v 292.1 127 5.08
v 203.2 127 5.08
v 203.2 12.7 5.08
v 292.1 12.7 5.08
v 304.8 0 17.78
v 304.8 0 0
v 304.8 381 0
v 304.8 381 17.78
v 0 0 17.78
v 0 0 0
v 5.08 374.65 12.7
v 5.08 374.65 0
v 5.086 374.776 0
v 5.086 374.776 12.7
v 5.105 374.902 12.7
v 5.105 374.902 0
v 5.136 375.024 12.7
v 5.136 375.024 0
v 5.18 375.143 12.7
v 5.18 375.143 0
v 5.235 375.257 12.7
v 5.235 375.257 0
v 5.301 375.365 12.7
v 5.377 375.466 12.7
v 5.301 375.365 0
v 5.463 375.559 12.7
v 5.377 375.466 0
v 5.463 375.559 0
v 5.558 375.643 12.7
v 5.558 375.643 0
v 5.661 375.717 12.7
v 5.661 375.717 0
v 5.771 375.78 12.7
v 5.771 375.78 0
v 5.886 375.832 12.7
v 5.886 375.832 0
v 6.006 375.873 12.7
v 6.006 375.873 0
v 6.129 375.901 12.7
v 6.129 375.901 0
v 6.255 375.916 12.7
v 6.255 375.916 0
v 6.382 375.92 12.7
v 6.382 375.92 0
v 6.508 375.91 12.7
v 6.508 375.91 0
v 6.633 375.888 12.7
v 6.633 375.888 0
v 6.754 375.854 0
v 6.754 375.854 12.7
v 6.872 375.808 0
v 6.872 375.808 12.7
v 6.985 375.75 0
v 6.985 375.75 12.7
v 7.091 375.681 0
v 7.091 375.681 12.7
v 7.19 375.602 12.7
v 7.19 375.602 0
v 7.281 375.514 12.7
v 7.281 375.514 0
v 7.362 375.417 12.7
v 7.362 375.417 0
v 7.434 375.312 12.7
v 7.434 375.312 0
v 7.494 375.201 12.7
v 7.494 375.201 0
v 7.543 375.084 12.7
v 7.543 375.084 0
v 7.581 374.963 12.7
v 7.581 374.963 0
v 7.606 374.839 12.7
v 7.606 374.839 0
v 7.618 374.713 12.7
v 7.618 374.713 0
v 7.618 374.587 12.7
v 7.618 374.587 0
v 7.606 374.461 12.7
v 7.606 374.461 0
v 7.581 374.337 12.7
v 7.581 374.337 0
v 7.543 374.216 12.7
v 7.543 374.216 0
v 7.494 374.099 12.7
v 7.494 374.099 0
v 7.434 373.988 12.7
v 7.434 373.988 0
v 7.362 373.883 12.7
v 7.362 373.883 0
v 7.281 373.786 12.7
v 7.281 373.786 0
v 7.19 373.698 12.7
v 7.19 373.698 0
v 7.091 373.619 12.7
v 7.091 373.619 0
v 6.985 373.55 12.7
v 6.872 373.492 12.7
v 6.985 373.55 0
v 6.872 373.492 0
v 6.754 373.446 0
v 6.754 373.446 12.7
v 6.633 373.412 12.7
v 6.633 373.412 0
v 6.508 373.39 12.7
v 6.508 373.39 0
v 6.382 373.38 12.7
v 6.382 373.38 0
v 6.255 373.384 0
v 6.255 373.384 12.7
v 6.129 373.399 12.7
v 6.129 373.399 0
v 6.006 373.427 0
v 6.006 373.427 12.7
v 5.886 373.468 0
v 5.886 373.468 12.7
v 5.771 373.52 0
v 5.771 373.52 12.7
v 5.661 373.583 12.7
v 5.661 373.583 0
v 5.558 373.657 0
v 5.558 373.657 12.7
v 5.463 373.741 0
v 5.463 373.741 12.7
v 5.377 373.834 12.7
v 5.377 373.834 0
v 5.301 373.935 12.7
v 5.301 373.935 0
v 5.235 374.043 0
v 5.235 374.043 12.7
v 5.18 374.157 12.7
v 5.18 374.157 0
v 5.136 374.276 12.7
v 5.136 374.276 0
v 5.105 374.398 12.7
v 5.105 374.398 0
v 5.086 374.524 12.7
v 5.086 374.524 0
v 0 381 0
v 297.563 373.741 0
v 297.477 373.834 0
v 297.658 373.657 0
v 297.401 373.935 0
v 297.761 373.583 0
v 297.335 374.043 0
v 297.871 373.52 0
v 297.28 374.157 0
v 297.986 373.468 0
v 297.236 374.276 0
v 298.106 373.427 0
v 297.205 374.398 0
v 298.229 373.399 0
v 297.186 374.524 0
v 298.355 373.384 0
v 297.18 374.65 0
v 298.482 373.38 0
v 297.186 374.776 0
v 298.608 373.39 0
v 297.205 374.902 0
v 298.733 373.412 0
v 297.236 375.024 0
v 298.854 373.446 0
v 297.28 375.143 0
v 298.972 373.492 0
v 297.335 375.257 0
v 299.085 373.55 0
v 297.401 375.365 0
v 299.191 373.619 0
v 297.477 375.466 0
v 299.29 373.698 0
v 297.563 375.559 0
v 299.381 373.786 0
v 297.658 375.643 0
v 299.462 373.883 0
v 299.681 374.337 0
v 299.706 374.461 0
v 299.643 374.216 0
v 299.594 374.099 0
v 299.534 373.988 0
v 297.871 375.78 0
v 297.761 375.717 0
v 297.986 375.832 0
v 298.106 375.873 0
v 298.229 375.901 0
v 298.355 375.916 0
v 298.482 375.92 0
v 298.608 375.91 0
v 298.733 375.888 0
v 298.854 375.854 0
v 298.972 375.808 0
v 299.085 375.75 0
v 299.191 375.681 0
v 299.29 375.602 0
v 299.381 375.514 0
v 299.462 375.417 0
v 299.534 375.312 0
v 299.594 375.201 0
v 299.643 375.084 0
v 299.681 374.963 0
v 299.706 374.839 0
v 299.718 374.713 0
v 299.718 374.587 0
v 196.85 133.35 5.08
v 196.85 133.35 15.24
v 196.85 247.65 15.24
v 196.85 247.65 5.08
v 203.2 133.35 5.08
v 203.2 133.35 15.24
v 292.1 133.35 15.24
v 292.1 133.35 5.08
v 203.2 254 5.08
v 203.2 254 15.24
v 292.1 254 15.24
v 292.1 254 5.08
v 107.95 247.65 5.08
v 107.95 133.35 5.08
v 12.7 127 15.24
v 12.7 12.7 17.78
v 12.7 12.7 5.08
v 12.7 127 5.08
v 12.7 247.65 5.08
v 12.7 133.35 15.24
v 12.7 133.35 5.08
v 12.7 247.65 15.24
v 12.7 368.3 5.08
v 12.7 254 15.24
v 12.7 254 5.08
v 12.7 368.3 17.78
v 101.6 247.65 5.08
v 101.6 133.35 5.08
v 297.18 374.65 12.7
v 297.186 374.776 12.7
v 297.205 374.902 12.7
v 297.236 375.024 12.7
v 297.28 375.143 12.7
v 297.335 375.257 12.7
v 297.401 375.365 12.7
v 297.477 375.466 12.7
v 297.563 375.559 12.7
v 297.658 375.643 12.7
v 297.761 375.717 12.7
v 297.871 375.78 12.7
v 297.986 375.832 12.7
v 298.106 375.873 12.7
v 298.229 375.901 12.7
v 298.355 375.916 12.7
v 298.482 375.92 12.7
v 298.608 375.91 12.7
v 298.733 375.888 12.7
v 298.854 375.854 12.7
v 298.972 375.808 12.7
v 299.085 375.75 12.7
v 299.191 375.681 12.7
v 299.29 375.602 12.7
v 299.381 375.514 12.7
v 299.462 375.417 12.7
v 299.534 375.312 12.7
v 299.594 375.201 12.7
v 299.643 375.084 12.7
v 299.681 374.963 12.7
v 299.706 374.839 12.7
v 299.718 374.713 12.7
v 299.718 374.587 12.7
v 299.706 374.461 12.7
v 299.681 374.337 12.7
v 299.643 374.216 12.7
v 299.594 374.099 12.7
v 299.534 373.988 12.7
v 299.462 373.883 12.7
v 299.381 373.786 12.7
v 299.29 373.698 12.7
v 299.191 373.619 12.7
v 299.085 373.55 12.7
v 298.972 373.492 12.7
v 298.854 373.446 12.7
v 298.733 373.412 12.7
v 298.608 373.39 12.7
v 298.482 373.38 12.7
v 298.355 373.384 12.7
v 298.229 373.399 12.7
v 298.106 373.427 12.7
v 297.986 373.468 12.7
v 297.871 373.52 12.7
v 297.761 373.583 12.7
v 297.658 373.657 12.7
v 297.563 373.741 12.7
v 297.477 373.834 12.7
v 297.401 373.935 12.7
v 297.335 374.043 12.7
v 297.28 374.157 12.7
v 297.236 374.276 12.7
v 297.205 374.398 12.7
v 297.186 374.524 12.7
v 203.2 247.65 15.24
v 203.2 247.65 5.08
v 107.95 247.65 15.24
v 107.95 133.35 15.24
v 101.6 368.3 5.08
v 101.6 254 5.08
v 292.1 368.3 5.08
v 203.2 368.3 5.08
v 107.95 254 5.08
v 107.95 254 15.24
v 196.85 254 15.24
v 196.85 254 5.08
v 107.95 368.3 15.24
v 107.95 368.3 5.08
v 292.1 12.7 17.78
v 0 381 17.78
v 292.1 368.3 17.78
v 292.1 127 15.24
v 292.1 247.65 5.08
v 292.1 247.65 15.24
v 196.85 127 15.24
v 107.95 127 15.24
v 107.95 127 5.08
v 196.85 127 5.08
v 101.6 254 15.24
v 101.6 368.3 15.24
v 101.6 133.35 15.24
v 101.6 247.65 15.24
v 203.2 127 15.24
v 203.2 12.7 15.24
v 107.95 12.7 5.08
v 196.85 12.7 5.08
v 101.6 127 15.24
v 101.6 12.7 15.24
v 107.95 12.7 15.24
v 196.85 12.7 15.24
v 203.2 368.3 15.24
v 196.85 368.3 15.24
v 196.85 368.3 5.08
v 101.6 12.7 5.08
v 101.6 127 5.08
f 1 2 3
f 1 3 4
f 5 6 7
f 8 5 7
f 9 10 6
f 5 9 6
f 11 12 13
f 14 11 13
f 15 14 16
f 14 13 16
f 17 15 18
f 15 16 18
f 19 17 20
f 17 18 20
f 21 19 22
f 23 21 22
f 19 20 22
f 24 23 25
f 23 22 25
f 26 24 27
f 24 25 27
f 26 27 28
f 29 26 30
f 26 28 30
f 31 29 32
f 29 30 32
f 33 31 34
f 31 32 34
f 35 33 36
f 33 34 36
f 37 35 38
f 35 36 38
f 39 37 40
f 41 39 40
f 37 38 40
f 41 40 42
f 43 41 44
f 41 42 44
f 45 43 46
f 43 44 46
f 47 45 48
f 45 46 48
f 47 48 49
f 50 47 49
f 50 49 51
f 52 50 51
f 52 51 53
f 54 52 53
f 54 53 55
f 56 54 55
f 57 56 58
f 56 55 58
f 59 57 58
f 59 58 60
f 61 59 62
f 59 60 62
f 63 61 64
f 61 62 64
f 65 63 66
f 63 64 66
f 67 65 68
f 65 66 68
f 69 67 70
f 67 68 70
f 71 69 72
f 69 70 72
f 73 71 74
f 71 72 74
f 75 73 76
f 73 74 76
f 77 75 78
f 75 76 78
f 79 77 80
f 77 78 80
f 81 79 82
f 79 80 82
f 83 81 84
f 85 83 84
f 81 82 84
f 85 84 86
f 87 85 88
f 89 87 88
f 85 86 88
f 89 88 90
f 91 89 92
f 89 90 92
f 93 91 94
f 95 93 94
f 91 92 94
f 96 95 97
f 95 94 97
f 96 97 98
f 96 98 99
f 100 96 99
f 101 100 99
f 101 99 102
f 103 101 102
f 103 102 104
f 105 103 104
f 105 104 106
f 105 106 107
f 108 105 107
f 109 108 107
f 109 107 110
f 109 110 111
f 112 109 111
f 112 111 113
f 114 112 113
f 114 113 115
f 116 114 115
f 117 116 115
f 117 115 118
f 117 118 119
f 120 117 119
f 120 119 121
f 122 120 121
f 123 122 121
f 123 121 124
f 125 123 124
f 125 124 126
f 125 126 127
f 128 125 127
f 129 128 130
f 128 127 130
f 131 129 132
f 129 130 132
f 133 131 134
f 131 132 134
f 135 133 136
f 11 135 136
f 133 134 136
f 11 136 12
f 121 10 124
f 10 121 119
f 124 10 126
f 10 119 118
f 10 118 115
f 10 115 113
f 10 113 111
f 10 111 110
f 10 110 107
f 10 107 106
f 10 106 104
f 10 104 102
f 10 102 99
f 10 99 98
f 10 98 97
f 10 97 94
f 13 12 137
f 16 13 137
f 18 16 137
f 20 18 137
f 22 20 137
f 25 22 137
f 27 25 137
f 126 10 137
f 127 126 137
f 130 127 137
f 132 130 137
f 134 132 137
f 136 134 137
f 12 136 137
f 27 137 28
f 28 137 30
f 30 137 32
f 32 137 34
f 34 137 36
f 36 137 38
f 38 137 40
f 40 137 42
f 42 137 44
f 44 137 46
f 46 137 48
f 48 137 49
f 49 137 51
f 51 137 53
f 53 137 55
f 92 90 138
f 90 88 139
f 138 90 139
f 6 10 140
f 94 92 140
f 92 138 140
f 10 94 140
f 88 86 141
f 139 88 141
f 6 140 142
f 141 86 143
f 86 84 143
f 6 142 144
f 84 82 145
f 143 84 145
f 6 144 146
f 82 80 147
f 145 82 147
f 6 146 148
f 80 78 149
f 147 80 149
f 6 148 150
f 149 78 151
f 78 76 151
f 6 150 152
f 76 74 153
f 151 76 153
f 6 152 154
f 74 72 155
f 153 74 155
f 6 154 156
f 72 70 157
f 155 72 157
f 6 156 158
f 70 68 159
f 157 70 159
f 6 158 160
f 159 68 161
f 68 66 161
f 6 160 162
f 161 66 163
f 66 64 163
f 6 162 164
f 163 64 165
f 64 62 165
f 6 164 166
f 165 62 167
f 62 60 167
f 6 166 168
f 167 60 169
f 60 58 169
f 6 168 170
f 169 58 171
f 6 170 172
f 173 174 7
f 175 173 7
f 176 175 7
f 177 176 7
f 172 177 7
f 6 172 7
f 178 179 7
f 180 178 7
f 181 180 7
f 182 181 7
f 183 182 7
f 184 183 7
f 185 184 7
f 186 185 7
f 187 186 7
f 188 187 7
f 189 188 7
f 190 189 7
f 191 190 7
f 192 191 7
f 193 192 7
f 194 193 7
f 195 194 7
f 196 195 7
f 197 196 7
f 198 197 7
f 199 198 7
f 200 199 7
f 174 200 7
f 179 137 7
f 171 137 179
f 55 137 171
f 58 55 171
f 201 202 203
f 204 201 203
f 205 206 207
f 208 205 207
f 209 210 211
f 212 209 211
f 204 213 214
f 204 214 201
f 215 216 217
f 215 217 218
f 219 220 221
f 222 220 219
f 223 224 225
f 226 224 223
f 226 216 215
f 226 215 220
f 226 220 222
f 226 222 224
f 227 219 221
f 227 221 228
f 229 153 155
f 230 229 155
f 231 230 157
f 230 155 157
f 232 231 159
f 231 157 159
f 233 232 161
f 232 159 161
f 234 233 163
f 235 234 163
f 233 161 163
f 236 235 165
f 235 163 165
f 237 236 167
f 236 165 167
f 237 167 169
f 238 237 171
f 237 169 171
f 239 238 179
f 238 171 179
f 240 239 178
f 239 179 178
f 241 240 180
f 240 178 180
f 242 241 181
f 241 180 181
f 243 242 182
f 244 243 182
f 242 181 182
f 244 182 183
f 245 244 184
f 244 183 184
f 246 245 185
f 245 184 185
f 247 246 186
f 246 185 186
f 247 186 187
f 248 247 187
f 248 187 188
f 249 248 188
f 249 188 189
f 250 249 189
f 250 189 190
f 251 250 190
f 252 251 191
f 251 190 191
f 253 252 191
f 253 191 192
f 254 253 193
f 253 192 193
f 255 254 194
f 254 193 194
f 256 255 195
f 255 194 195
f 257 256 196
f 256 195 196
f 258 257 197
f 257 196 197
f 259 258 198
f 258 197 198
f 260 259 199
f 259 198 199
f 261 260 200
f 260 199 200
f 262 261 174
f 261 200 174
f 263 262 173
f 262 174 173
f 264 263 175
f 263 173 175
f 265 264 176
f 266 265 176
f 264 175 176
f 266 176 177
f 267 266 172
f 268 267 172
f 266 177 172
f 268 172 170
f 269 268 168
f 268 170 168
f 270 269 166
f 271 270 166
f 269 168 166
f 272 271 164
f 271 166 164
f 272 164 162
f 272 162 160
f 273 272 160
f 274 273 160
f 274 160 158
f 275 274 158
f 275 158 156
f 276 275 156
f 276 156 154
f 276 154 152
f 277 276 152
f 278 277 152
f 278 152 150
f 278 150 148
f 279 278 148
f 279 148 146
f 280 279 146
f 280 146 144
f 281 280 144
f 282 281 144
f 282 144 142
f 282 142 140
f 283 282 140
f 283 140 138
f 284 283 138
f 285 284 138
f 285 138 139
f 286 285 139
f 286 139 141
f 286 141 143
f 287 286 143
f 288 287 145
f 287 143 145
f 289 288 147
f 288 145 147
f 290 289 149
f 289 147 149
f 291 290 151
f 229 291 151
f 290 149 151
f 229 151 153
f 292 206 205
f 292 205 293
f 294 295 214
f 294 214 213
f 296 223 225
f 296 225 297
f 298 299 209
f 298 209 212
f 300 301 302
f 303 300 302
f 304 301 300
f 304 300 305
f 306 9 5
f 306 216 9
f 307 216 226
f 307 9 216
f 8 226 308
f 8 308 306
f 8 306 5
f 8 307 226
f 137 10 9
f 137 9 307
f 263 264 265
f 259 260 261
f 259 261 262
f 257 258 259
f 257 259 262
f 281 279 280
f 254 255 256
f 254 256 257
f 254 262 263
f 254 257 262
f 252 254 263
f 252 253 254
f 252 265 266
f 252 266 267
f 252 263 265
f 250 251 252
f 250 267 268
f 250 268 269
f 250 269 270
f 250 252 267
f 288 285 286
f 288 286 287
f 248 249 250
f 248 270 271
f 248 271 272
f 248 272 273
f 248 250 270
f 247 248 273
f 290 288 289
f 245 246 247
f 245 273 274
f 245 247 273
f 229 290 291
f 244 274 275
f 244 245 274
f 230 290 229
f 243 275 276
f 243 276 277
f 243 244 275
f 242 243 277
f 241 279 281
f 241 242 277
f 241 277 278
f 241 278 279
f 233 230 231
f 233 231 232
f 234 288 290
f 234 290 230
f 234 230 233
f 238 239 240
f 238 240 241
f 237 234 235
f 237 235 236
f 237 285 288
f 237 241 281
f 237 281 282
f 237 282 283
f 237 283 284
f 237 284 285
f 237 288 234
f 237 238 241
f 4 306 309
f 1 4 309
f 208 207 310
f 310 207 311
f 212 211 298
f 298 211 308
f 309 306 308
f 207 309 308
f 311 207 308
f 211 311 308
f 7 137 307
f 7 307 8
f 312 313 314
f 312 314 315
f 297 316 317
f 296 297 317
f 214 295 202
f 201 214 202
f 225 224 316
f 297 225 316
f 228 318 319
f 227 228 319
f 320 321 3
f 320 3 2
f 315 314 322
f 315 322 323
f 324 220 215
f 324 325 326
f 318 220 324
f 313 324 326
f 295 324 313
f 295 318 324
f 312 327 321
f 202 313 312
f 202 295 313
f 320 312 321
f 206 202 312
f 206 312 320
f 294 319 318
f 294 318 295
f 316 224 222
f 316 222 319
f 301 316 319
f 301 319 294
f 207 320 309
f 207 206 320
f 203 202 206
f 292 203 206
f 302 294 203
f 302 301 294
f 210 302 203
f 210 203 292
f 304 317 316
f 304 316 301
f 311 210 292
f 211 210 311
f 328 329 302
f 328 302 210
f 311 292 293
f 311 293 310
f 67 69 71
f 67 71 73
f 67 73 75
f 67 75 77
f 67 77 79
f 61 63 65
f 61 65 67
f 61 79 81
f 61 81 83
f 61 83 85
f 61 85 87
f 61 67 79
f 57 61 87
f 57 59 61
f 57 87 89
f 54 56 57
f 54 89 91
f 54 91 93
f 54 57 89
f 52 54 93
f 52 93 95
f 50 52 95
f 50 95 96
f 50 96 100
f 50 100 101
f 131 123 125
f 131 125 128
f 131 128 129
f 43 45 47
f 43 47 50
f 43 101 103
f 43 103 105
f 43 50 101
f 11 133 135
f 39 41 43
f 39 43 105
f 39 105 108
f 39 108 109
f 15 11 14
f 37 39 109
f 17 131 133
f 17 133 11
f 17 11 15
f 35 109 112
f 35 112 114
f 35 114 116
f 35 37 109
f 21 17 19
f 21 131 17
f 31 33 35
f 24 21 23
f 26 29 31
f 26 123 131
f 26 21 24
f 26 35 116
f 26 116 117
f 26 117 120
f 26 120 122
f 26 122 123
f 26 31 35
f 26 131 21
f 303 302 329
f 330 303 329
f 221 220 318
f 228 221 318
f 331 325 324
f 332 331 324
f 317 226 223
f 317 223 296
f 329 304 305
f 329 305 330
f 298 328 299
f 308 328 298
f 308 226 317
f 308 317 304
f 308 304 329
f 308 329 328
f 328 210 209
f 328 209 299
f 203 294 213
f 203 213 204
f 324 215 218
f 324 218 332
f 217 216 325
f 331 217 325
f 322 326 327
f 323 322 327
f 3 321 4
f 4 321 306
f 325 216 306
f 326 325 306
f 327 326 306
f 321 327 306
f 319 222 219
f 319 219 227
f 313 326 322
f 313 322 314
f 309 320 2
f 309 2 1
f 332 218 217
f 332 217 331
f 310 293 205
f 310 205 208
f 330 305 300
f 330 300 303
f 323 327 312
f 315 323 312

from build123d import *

# Parameters (mm, degrees)
SKETCH1_W           = 304.8
SKETCH1_H           = 381
BOSS_EXTRUDE1_DEPTH = 17.78
SKETCH2_W           = 88.9
SKETCH2_H           = 114.3
CUT_EXTRUDE1_DEPTH  = 12.7
SKETCH3_W           = 279.4
SKETCH3_H           = 355.6
CUT_EXTRUDE2_DEPTH  = 2.54
SKETCH4_R           = 1.27
CUT_EXTRUDE3_DEPTH  = 12.7


with BuildPart() as part:
    # Sketch1 → Boss-Extrude1 (new body)
    with BuildSketch(Plane.XY):
        with Locations((152.4, 190.5)):
            Rectangle(SKETCH1_W, SKETCH1_H)
    extrude(amount=BOSS_EXTRUDE1_DEPTH)

    # Sketch2 → Cut-Extrude1 (cut)
    with BuildSketch(Plane.XY.offset(17.78)):
        with Locations((57.15, 69.85)):
            Rectangle(SKETCH2_W, SKETCH2_H)
        with Locations((152.4, 311.15)):
            Rectangle(SKETCH2_W, SKETCH2_H)
        with Locations((57.15, 311.15)):
            Rectangle(SKETCH2_W, SKETCH2_H)
        with Locations((247.65, 311.15)):
            Rectangle(SKETCH2_W, SKETCH2_H)
        with Locations((57.15, 190.5)):
            Rectangle(SKETCH2_W, SKETCH2_H)
        with Locations((152.4, 190.5)):
            Rectangle(SKETCH2_W, SKETCH2_H)
        with Locations((247.65, 190.5)):
            Rectangle(SKETCH2_W, SKETCH2_H)
        with Locations((152.4, 69.85)):
            Rectangle(SKETCH2_W, SKETCH2_H)
        with Locations((247.65, 69.85)):
            Rectangle(SKETCH2_W, SKETCH2_H)
    extrude(amount=-CUT_EXTRUDE1_DEPTH, mode=Mode.SUBTRACT)

    # Sketch3 → Cut-Extrude2 (cut)
    with BuildSketch(Plane.XY.offset(17.78)):
        with Locations((152.4, 190.5)):
            Rectangle(SKETCH3_W, SKETCH3_H)
    extrude(amount=-CUT_EXTRUDE2_DEPTH, mode=Mode.SUBTRACT)

    # Sketch4 → Cut-Extrude3 (cut)
    with BuildSketch(Plane(origin=(0, 0, 0), x_dir=(-1, 0, 0), z_dir=(0, 0, -1))):
        with Locations((-6.35, 374.65)):
            Circle(SKETCH4_R)
        with Locations((-298.45, 374.65)):
            Circle(SKETCH4_R)
    extrude(amount=-CUT_EXTRUDE3_DEPTH, mode=Mode.SUBTRACT)


solid = part.part
